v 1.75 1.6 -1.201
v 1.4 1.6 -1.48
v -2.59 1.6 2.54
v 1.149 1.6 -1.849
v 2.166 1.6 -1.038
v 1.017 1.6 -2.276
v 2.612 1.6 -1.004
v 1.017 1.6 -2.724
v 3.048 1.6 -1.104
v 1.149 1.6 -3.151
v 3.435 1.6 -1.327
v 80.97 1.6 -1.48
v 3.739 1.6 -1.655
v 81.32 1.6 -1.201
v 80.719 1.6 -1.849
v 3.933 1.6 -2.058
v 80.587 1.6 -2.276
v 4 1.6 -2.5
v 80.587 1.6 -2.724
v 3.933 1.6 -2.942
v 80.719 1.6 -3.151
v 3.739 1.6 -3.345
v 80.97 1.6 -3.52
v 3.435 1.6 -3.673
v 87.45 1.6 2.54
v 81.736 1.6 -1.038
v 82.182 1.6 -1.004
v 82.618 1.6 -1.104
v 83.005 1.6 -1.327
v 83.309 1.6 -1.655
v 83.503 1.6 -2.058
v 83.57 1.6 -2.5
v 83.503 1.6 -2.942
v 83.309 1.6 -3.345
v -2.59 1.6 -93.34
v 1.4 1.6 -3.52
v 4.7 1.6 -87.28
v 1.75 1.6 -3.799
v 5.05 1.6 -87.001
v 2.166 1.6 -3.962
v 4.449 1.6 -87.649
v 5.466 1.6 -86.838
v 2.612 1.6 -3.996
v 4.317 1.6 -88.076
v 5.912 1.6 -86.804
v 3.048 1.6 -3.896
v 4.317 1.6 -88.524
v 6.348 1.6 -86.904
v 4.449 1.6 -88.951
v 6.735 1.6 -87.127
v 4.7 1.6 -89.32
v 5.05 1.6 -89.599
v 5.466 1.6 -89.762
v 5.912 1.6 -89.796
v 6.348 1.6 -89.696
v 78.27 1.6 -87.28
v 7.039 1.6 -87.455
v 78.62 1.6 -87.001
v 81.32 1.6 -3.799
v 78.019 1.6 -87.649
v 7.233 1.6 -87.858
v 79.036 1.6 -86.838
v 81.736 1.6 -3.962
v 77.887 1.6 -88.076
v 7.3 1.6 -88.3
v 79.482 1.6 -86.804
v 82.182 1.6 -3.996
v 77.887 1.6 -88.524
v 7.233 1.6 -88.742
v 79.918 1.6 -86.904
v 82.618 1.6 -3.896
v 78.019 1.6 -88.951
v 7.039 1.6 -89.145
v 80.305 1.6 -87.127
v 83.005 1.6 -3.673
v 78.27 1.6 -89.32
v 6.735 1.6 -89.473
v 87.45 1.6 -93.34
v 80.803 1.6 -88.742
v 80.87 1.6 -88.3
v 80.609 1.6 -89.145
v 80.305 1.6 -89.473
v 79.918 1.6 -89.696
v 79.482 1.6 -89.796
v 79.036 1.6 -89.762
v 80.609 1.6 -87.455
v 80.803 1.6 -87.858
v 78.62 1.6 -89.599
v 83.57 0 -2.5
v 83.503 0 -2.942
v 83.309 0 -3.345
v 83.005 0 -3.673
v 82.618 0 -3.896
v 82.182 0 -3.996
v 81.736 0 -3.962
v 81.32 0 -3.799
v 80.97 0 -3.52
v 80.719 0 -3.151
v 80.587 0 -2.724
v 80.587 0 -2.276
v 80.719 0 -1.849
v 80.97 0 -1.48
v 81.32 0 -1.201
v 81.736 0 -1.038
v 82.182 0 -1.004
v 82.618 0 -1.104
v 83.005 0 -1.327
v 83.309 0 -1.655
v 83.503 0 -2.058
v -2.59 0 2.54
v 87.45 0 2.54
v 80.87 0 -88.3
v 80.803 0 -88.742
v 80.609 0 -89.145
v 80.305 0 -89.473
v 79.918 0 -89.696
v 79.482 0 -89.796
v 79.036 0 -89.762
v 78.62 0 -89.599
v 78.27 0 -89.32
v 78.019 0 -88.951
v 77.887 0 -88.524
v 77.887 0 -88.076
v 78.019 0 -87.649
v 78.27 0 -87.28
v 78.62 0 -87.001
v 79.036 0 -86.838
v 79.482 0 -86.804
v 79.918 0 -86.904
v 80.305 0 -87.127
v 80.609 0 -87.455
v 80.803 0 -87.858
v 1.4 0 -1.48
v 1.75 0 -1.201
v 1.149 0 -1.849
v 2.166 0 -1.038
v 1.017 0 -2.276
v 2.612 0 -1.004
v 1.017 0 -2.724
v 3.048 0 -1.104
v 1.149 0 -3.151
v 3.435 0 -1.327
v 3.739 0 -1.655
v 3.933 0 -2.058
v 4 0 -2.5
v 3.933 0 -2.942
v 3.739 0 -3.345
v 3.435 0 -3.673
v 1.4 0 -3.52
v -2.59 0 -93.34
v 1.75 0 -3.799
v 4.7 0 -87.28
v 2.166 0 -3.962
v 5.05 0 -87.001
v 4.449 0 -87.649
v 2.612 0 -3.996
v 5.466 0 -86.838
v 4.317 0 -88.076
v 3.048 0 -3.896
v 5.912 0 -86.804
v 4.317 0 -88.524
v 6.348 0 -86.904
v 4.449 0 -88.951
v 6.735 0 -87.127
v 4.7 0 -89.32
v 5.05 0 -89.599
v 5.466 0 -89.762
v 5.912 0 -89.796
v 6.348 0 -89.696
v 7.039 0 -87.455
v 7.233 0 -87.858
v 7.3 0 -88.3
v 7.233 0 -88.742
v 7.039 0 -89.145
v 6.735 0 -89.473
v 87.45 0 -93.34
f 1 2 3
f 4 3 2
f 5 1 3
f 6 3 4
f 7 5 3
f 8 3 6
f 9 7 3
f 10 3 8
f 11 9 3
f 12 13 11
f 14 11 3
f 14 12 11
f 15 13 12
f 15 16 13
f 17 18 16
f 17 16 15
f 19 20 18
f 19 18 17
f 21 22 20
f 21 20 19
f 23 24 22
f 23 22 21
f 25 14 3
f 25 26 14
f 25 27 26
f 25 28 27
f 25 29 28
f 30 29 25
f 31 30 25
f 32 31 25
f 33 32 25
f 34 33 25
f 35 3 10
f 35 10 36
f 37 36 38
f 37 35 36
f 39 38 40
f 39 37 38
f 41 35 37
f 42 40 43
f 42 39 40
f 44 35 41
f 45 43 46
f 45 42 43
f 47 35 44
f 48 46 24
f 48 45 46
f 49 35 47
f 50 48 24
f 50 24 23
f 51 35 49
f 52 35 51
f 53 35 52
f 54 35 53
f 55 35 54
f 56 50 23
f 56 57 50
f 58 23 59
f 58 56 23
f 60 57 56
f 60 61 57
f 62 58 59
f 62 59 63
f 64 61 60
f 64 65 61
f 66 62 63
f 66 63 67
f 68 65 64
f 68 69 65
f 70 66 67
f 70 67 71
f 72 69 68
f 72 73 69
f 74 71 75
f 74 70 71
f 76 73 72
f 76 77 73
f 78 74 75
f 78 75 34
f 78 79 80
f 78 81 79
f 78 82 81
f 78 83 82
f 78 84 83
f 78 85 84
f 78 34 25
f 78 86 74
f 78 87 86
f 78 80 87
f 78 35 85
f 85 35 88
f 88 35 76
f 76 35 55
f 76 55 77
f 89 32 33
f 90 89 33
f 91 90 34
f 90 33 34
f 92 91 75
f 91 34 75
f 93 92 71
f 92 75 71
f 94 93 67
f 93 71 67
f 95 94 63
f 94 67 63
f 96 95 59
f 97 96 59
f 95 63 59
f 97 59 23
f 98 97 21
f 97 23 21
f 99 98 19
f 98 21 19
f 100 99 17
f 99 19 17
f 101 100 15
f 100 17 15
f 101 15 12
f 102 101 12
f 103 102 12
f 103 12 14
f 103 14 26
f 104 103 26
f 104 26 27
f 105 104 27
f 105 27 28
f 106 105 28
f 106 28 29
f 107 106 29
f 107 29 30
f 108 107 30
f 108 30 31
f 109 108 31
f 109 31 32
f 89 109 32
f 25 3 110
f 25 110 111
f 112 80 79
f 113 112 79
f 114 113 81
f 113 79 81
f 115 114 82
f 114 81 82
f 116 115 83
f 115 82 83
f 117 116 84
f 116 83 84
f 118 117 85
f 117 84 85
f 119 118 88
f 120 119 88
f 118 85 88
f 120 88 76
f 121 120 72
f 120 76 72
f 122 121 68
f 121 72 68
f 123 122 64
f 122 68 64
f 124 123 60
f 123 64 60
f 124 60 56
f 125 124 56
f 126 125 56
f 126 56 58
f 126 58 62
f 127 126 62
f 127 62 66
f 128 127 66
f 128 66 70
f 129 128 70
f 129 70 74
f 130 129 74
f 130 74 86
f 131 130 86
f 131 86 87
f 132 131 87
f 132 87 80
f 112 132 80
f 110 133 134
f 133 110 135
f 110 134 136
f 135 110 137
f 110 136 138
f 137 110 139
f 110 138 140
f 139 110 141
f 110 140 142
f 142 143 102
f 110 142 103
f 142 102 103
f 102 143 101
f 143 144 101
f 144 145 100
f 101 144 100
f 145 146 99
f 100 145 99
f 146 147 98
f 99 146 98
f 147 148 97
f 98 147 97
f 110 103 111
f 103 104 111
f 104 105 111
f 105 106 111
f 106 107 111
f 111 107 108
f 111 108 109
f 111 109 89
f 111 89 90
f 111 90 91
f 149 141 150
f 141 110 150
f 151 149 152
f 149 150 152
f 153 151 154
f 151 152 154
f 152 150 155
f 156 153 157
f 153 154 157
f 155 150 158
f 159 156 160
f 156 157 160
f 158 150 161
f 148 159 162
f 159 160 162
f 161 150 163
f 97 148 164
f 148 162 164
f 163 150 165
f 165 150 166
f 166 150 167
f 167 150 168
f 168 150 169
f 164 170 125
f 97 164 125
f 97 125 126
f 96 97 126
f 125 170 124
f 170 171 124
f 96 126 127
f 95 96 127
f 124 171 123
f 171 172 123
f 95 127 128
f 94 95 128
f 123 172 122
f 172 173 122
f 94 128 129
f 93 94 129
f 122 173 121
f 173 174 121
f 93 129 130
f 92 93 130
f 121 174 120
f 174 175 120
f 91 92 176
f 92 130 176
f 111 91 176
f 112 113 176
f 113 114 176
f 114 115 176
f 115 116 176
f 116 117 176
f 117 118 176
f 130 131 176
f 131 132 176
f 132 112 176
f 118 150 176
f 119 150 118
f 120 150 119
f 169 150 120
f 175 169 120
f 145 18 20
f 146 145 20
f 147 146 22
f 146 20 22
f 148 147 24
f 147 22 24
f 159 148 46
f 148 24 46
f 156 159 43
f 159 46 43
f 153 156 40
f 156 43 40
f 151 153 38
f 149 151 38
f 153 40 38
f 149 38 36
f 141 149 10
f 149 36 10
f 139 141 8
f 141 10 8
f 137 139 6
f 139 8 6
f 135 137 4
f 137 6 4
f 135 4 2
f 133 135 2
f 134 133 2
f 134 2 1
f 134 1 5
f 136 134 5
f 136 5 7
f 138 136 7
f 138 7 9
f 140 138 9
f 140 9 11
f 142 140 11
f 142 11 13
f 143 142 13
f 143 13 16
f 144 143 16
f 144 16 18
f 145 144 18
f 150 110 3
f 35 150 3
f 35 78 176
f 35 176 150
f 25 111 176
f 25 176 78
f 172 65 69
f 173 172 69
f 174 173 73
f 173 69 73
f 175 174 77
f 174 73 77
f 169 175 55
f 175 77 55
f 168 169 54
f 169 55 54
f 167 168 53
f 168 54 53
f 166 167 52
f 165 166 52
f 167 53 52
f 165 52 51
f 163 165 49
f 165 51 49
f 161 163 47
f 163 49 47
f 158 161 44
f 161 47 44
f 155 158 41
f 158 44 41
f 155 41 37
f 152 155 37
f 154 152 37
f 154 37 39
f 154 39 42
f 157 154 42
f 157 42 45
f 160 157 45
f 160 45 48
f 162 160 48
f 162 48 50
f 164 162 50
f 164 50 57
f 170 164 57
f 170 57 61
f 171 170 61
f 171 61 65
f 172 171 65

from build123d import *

# Parameters (mm, degrees)
SKETCH2_W           = 84.57
SKETCH2_H           = 90.8
BOSS_EXTRUDE1_DEPTH = 1.6
SKETCH3_R           = 1.5
CUT_EXTRUDE1_DEPTH  = 2.6
SKETCH4_W           = 90.8
SKETCH4_H           = 1.6
BOSS_EXTRUDE2_DEPTH = 2.88
SKETCH5_W           = 90.8
SKETCH5_H           = 1.6
BOSS_EXTRUDE3_DEPTH = 2.59
SKETCH6_W           = 90.04
SKETCH6_H           = 1.6
BOSS_EXTRUDE4_DEPTH = 2.54
SKETCH7_W           = 90.04
SKETCH7_H           = 1.6
BOSS_EXTRUDE5_DEPTH = 2.54


with BuildPart() as part:
    # Sketch2 → Boss-Extrude1 (new body)
    with BuildSketch(Plane(origin=(0, 0, 0), x_dir=(1, 0, 0), z_dir=(0, 1, 0))):
        with Locations((42.285, 45.4)):
            Rectangle(SKETCH2_W, SKETCH2_H)
    extrude(amount=BOSS_EXTRUDE1_DEPTH)

    # Sketch3 → Cut-Extrude1 (cut, through all)
    with BuildSketch(Plane(origin=(0, 1.6, 0), x_dir=(1, 0, 0), z_dir=(0, 1, 0))):
        with Locations((2.5, 2.5)):
            Circle(SKETCH3_R)
        with Locations((82.07, 2.5)):
            Circle(SKETCH3_R)
        with Locations((5.8, 88.3)):
            Circle(SKETCH3_R)
        with Locations((79.37, 88.3)):
            Circle(SKETCH3_R)
    extrude(amount=-CUT_EXTRUDE1_DEPTH, mode=Mode.SUBTRACT)

    # Sketch4 → Boss-Extrude2 (add)
    with BuildSketch(Plane(origin=(84.57, 0, 0), x_dir=(0, 0, -1), z_dir=(1, 0, 0))):
        with Locations((45.4, 0.8)):
            Rectangle(SKETCH4_W, SKETCH4_H)
    extrude(amount=BOSS_EXTRUDE2_DEPTH)

    # Sketch5 → Boss-Extrude3 (add)
    with BuildSketch(Plane.ZY):
        with Locations((-45.4, 0.8)):
            Rectangle(SKETCH5_W, SKETCH5_H)
    extrude(amount=BOSS_EXTRUDE3_DEPTH)

    # Sketch6 → Boss-Extrude4 (add)
    with BuildSketch(Plane(origin=(0, 0, -90.8), x_dir=(-1, 0, 0), z_dir=(0, 0, -1))):
        with Locations((-42.43, 0.8)):
            Rectangle(SKETCH6_W, SKETCH6_H)
    extrude(amount=BOSS_EXTRUDE4_DEPTH)

    # Sketch7 → Boss-Extrude5 (add)
    with BuildSketch(Plane.XY):
        with Locations((42.43, 0.8)):
            Rectangle(SKETCH7_W, SKETCH7_H)
    extrude(amount=BOSS_EXTRUDE5_DEPTH)


solid = part.part
